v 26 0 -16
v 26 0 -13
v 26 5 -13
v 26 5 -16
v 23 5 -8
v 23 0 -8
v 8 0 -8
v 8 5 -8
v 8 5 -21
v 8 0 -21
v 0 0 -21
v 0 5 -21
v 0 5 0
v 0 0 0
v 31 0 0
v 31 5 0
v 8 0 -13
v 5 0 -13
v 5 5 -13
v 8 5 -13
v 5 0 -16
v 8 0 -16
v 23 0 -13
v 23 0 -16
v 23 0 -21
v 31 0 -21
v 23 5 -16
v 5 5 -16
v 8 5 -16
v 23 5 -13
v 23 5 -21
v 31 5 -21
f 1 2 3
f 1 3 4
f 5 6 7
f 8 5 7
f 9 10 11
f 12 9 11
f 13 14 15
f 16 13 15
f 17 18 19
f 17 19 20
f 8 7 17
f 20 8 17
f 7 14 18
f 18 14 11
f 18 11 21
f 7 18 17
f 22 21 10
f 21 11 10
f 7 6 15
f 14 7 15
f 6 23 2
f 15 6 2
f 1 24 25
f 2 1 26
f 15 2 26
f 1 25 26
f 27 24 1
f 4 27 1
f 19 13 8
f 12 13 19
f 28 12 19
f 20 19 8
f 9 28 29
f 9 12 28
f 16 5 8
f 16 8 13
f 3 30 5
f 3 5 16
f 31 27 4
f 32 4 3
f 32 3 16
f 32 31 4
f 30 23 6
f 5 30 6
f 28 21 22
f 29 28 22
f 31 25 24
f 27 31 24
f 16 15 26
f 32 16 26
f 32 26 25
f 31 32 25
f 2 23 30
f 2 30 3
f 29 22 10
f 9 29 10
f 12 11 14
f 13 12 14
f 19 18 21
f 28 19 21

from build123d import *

# Parameters (mm, degrees)
EXTRUDE_1_DEPTH     = 5
CUT_EXTRUDE_START   = -5
SKETCH_2_W          = 21
SKETCH_2_H          = 3
CUT_EXTRUDE_1_DEPTH = 5


with BuildPart() as part:
    # 草图1 → 凸台-拉伸1 (new body)
    with BuildSketch(Plane(origin=(0, 0, 0), x_dir=(1, 0, 0), z_dir=(0, 1, 0))):
        Polygon((0, 21), (0, 0), (31, 0), (31, 21), (23, 21), (23, 8), (8, 8), (8, 21), align=None)
    extrude(amount=EXTRUDE_1_DEPTH)

    # 草图2 → 切除-拉伸1 (cut)
    with BuildSketch(Plane(origin=(0, 5, 0), x_dir=(1, 0, 0), z_dir=(0, 1, 0)).offset(CUT_EXTRUDE_START)):
        with Locations((15.5, 14.5)):
            Rectangle(SKETCH_2_W, SKETCH_2_H)
    extrude(amount=CUT_EXTRUDE_1_DEPTH, mode=Mode.SUBTRACT)


solid = part.part
